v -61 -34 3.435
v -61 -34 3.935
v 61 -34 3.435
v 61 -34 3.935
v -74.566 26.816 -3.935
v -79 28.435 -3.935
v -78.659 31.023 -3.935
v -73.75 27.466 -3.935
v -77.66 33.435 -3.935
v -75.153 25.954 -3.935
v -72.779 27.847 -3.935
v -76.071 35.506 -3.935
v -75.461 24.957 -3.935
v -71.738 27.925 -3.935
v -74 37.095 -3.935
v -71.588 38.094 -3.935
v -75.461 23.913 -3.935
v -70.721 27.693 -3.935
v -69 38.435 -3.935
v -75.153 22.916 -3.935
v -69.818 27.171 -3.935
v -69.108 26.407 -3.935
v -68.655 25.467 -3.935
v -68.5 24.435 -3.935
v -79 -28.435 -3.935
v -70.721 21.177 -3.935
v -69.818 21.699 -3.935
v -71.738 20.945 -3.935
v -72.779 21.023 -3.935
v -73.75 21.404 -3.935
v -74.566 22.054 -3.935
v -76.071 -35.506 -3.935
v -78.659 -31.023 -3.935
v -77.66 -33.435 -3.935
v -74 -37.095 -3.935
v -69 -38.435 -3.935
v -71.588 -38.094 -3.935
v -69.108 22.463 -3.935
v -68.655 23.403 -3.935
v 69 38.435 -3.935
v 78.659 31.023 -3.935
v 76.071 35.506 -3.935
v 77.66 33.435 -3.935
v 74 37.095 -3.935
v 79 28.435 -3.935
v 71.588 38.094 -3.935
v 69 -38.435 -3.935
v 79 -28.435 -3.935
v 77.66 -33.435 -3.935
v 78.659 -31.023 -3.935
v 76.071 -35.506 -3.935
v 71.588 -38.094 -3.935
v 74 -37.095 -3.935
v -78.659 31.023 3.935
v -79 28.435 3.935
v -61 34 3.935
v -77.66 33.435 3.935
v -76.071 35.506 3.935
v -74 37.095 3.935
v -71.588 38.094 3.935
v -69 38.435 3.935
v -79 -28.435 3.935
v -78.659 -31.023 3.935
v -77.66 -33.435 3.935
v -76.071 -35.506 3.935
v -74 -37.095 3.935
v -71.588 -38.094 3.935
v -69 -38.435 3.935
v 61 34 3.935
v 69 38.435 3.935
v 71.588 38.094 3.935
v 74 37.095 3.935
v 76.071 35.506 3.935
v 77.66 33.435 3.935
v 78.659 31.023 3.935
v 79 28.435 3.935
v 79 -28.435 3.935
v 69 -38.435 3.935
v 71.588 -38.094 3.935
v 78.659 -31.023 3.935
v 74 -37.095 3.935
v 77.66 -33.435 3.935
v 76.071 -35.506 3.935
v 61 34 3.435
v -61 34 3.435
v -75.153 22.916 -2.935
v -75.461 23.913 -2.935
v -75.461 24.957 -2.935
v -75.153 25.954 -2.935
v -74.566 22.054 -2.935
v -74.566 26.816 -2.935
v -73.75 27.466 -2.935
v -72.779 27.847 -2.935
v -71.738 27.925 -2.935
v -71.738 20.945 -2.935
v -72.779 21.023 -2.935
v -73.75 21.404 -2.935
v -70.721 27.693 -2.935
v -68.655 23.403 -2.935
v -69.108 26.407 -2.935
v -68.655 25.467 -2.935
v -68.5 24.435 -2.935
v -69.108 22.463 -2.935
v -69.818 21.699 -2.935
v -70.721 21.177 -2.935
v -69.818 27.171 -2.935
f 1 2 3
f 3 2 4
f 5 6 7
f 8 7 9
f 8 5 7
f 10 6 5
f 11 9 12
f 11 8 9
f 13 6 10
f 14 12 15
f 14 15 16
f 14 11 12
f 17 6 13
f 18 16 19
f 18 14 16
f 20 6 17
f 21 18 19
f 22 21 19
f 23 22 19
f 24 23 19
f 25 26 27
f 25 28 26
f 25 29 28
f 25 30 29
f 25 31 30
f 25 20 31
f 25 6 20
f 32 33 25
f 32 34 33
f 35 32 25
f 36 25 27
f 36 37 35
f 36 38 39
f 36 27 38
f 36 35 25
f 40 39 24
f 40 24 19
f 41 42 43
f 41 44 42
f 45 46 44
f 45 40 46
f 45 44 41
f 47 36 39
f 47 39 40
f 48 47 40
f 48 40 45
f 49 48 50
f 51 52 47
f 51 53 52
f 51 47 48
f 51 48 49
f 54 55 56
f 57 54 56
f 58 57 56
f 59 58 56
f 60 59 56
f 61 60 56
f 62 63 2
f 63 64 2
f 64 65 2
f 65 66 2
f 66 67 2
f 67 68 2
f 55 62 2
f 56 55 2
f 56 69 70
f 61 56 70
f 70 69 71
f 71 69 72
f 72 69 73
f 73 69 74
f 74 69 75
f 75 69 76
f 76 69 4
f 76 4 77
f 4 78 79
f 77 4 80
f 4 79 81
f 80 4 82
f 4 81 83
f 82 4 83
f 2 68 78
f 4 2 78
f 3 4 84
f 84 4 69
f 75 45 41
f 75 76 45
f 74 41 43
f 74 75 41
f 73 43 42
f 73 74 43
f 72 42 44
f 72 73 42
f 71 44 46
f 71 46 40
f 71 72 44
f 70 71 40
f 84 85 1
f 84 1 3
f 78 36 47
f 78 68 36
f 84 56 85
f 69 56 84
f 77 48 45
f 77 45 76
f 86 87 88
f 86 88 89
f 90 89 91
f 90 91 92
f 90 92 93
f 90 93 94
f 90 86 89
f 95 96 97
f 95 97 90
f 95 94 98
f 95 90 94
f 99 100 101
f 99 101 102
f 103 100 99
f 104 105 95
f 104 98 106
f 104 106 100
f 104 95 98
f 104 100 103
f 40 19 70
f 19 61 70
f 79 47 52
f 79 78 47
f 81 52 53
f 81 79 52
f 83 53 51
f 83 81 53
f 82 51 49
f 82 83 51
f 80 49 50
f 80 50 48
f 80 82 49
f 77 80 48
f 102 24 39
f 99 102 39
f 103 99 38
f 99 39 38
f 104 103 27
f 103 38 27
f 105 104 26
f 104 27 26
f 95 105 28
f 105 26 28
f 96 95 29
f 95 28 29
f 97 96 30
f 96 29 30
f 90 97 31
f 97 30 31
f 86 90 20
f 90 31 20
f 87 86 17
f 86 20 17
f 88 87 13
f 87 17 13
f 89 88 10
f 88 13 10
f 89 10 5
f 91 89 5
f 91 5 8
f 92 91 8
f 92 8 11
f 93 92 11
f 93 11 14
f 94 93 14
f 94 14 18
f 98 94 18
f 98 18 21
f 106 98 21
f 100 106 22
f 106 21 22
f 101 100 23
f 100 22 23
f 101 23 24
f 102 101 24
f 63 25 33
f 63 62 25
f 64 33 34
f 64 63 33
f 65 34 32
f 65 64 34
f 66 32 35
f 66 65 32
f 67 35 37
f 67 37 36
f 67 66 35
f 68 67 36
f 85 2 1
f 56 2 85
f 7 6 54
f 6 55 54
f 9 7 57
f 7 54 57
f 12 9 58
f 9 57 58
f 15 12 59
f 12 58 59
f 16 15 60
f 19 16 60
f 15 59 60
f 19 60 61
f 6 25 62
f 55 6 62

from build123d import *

# Parameters (mm, degrees)
F0_W     = 158
F0_H     = 7.87
F1_DEPTH = 38.435
F2_R     = 10
F3_W     = 122
F3_H     = 68
F4_DEPTH = 0.5
F7_R     = 3.5
F8_DEPTH = 1


# Not quite as in the source:
# - the program builds the solid bodies; features that only make, move or delete a surface that nothing else refers to are left out


with BuildPart() as f1:
    # F0 (on Front) → F1 (new body, symmetric)
    with BuildSketch(Plane.XZ):
        Rectangle(F0_W, F0_H)
    extrude(amount=F1_DEPTH, both=True)

    # F2
    f2_edges = [f1.edges().sort_by_distance(p)[0] for p in [
        (-79, 38.435, 0),
        (-79, -38.435, 0),
        (79, -38.435, 0),
        (79, 38.435, 0),
    ]]
    fillet(f2_edges, radius=F2_R)

    # F3 (on face) → F4 (cut)
    with BuildSketch(Plane.XY.offset(3.935)):
        Rectangle(F3_W, F3_H)
    extrude(amount=-F4_DEPTH, mode=Mode.SUBTRACT)

    # F7 (on face) → F8 (cut)
    with BuildSketch(Plane(origin=(0, 0, -3.935), x_dir=(1, 0, 0), z_dir=(0, 0, -1))):
        with Locations((-72, -24.435)):
            Circle(F7_R)
    extrude(amount=-F8_DEPTH, mode=Mode.SUBTRACT)


solid = f1.part
